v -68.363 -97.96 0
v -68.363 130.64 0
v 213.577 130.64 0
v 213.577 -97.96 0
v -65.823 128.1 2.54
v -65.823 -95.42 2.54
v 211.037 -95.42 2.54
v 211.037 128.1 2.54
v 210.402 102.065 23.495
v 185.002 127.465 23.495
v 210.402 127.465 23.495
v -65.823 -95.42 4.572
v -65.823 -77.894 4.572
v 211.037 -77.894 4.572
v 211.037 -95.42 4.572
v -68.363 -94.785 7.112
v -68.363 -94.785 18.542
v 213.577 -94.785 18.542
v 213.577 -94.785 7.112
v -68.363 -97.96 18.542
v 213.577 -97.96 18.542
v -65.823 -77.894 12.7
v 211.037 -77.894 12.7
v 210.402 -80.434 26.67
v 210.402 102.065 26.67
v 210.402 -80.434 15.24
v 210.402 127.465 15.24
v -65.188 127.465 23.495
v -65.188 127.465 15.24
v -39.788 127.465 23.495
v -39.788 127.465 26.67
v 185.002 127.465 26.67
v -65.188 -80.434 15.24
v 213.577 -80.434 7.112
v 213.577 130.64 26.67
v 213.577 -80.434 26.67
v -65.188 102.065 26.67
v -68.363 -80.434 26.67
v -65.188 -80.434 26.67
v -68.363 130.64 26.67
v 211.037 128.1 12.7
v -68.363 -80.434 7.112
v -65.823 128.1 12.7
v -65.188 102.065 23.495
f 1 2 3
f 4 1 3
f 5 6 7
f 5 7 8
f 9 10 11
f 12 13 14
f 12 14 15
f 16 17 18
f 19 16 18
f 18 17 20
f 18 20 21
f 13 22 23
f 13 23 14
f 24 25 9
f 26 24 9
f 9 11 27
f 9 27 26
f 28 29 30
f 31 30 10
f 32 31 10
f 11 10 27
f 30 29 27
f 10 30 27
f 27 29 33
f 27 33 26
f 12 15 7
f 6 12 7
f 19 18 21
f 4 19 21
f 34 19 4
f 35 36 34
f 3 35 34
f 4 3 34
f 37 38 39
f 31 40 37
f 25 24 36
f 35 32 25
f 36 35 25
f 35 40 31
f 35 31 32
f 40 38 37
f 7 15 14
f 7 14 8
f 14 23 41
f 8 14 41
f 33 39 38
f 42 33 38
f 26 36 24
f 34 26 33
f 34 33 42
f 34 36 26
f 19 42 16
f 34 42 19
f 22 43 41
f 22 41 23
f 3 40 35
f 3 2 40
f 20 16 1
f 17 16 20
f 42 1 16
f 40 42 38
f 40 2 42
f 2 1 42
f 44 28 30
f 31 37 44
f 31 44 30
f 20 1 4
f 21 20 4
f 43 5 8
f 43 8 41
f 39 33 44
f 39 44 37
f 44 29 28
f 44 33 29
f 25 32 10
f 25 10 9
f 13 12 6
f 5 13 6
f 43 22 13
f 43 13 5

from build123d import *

# Parameters (mm, degrees)
SKETCH1_W            = 281.94
SKETCH1_H            = 228.6
BOSS_EXTRUDE2_DEPTH  = 25.4
SKETCH3_W            = 281.94
SKETCH3_H            = 17.526
CUT_EXTRUDE1_DEPTH   = 8.128
SKETCH4_W            = 11.43
SKETCH4_H            = 211.074
BOSS_EXTRUDE4_DEPTH  = 3.175
SKETCH5_W            = 278.765
SKETCH5_H            = 11.43
BOSS_EXTRUDE9_DEPTH  = 3.175
SKETCH9_W            = 11.43
SKETCH9_H            = 207.899
BOSS_EXTRUDE10_DEPTH = 3.175
SKETCH8_W            = 281.94
SKETCH8_H            = 11.43
BOSS_EXTRUDE11_DEPTH = 3.175
SKETCH10_W           = 281.94
SKETCH10_H           = 14.351
CUT_EXTRUDE2_DEPTH   = 10.16
SKETCH11_W           = 275.59
SKETCH11_H           = 207.899
CUT_EXTRUDE3_DEPTH   = 10.16
CUT_EXTRUDE4_DEPTH   = 10.16
SKETCH13_W           = 281.94
SKETCH13_H           = 3.175
CUT_EXTRUDE5_DEPTH   = 10.16
SHELL4_START         = -65.823170732
SHELL4_DEPTH         = 276.86
BOSS_EXTRUDE12_DEPTH = 3.175


# Read off the part's stored shape, not the designer's step: Shell4
with BuildPart() as part:
    # Sketch1 → Boss-Extrude2 (new body)
    with BuildSketch(Plane.XY):
        with Locations((72.606829268, 16.339634146)):
            Rectangle(SKETCH1_W, SKETCH1_H)
    extrude(amount=BOSS_EXTRUDE2_DEPTH)

    # Sketch3 → Cut-Extrude1 (cut)
    with BuildSketch(Plane.XY.offset(25.4)):
        with Locations((72.606829268, -89.197365854)):
            Rectangle(SKETCH3_W, SKETCH3_H)
    extrude(amount=-CUT_EXTRUDE1_DEPTH, mode=Mode.SUBTRACT)



with BuildPart() as body_2:
    # Sketch4 → Boss-Extrude4 (new body)
    with BuildSketch(Plane.ZY.offset(68.363170732)):
        with Locations((31.115, 25.102634146)):
            Rectangle(SKETCH4_W, SKETCH4_H)
    extrude(amount=-BOSS_EXTRUDE4_DEPTH)


with BuildPart() as part_1:
    add(part.part)

    add(body_2.part)  # Boss-Extrude9 merges body 2
    # Sketch5 → Boss-Extrude9 (add)
    with BuildSketch(Plane(origin=(0, 130.639634146, 0), x_dir=(1, 0, 0), z_dir=(0, 1, 0))):
        with Locations((74.194329268, -31.115)):
            Rectangle(SKETCH5_W, SKETCH5_H)
    extrude(amount=-BOSS_EXTRUDE9_DEPTH)

    # Sketch9 → Boss-Extrude10 (add)
    with BuildSketch(Plane(origin=(213.576829268, 0, 0), x_dir=(0, 0, -1), z_dir=(1, 0, 0))):
        with Locations((-31.115, 23.515134146)):
            Rectangle(SKETCH9_W, SKETCH9_H)
    extrude(amount=-BOSS_EXTRUDE10_DEPTH)


with BuildPart() as body_2_2:
    # Sketch8 → Boss-Extrude11 (new body)
    with BuildSketch(Plane.XZ.offset(97.960365854)):
        with Locations((72.606829268, 22.987)):
            Rectangle(SKETCH8_W, SKETCH8_H)
    extrude(amount=-BOSS_EXTRUDE11_DEPTH)

    # Combine1: union part
    add(part_1.part)

    # Sketch10 → Cut-Extrude2 (cut)
    with BuildSketch(Plane.XY.offset(17.272)):
        with Locations((72.606829268, -87.609865854)):
            Rectangle(SKETCH10_W, SKETCH10_H)
    extrude(amount=-CUT_EXTRUDE2_DEPTH, mode=Mode.SUBTRACT)

    # Sketch11 → Cut-Extrude3 (cut)
    with BuildSketch(Plane.XY.offset(25.4)):
        with Locations((72.606829268, 23.515134146)):
            Rectangle(SKETCH11_W, SKETCH11_H)
    extrude(amount=-CUT_EXTRUDE3_DEPTH, mode=Mode.SUBTRACT)

    # Sketch12 → Cut-Extrude4 (cut)
    with BuildSketch(Plane.XY.offset(36.83)):
        Polygon((-68.363170732, -80.434365854), (-65.188170732, -80.434365854), (-65.188170732, 127.464634146), (210.401829268, 127.464634146), (210.401829268, -80.434365854), (213.576829268, -80.434365854), (213.576829268, 130.639634146), (-68.363170732, 130.639634146), align=None)
    extrude(amount=-CUT_EXTRUDE4_DEPTH, mode=Mode.SUBTRACT)

    # Sketch13 → Cut-Extrude5 (cut)
    with BuildSketch(Plane.XY.offset(28.702)):
        with Locations((72.606829268, -96.372865854)):
            Rectangle(SKETCH13_W, SKETCH13_H)
    extrude(amount=-CUT_EXTRUDE5_DEPTH, mode=Mode.SUBTRACT)

    # Shell4 outline → Shell4 (cut)
    with BuildSketch(Plane.YZ.offset(SHELL4_START)):
        Polygon((-95.420365854, 4.572), (-95.420365854, 2.54), (128.099634146, 2.54), (128.099634146, 12.7), (-77.894365854, 12.7), (-77.894365854, 4.572), align=None)
    extrude(amount=SHELL4_DEPTH, mode=Mode.SUBTRACT)

    # Sketch14 → Boss-Extrude12 (add)
    with BuildSketch(Plane.XY.offset(26.67)):
        Polygon((-65.188170732, 102.064634146), (-39.788170732, 127.464634146), (-65.188170732, 127.464634146), align=None)
        Polygon((185.001829268, 127.464634146), (210.401829268, 102.064634146), (210.401829268, 127.464634146), align=None)
    extrude(amount=-BOSS_EXTRUDE12_DEPTH)


solid = body_2_2.part
